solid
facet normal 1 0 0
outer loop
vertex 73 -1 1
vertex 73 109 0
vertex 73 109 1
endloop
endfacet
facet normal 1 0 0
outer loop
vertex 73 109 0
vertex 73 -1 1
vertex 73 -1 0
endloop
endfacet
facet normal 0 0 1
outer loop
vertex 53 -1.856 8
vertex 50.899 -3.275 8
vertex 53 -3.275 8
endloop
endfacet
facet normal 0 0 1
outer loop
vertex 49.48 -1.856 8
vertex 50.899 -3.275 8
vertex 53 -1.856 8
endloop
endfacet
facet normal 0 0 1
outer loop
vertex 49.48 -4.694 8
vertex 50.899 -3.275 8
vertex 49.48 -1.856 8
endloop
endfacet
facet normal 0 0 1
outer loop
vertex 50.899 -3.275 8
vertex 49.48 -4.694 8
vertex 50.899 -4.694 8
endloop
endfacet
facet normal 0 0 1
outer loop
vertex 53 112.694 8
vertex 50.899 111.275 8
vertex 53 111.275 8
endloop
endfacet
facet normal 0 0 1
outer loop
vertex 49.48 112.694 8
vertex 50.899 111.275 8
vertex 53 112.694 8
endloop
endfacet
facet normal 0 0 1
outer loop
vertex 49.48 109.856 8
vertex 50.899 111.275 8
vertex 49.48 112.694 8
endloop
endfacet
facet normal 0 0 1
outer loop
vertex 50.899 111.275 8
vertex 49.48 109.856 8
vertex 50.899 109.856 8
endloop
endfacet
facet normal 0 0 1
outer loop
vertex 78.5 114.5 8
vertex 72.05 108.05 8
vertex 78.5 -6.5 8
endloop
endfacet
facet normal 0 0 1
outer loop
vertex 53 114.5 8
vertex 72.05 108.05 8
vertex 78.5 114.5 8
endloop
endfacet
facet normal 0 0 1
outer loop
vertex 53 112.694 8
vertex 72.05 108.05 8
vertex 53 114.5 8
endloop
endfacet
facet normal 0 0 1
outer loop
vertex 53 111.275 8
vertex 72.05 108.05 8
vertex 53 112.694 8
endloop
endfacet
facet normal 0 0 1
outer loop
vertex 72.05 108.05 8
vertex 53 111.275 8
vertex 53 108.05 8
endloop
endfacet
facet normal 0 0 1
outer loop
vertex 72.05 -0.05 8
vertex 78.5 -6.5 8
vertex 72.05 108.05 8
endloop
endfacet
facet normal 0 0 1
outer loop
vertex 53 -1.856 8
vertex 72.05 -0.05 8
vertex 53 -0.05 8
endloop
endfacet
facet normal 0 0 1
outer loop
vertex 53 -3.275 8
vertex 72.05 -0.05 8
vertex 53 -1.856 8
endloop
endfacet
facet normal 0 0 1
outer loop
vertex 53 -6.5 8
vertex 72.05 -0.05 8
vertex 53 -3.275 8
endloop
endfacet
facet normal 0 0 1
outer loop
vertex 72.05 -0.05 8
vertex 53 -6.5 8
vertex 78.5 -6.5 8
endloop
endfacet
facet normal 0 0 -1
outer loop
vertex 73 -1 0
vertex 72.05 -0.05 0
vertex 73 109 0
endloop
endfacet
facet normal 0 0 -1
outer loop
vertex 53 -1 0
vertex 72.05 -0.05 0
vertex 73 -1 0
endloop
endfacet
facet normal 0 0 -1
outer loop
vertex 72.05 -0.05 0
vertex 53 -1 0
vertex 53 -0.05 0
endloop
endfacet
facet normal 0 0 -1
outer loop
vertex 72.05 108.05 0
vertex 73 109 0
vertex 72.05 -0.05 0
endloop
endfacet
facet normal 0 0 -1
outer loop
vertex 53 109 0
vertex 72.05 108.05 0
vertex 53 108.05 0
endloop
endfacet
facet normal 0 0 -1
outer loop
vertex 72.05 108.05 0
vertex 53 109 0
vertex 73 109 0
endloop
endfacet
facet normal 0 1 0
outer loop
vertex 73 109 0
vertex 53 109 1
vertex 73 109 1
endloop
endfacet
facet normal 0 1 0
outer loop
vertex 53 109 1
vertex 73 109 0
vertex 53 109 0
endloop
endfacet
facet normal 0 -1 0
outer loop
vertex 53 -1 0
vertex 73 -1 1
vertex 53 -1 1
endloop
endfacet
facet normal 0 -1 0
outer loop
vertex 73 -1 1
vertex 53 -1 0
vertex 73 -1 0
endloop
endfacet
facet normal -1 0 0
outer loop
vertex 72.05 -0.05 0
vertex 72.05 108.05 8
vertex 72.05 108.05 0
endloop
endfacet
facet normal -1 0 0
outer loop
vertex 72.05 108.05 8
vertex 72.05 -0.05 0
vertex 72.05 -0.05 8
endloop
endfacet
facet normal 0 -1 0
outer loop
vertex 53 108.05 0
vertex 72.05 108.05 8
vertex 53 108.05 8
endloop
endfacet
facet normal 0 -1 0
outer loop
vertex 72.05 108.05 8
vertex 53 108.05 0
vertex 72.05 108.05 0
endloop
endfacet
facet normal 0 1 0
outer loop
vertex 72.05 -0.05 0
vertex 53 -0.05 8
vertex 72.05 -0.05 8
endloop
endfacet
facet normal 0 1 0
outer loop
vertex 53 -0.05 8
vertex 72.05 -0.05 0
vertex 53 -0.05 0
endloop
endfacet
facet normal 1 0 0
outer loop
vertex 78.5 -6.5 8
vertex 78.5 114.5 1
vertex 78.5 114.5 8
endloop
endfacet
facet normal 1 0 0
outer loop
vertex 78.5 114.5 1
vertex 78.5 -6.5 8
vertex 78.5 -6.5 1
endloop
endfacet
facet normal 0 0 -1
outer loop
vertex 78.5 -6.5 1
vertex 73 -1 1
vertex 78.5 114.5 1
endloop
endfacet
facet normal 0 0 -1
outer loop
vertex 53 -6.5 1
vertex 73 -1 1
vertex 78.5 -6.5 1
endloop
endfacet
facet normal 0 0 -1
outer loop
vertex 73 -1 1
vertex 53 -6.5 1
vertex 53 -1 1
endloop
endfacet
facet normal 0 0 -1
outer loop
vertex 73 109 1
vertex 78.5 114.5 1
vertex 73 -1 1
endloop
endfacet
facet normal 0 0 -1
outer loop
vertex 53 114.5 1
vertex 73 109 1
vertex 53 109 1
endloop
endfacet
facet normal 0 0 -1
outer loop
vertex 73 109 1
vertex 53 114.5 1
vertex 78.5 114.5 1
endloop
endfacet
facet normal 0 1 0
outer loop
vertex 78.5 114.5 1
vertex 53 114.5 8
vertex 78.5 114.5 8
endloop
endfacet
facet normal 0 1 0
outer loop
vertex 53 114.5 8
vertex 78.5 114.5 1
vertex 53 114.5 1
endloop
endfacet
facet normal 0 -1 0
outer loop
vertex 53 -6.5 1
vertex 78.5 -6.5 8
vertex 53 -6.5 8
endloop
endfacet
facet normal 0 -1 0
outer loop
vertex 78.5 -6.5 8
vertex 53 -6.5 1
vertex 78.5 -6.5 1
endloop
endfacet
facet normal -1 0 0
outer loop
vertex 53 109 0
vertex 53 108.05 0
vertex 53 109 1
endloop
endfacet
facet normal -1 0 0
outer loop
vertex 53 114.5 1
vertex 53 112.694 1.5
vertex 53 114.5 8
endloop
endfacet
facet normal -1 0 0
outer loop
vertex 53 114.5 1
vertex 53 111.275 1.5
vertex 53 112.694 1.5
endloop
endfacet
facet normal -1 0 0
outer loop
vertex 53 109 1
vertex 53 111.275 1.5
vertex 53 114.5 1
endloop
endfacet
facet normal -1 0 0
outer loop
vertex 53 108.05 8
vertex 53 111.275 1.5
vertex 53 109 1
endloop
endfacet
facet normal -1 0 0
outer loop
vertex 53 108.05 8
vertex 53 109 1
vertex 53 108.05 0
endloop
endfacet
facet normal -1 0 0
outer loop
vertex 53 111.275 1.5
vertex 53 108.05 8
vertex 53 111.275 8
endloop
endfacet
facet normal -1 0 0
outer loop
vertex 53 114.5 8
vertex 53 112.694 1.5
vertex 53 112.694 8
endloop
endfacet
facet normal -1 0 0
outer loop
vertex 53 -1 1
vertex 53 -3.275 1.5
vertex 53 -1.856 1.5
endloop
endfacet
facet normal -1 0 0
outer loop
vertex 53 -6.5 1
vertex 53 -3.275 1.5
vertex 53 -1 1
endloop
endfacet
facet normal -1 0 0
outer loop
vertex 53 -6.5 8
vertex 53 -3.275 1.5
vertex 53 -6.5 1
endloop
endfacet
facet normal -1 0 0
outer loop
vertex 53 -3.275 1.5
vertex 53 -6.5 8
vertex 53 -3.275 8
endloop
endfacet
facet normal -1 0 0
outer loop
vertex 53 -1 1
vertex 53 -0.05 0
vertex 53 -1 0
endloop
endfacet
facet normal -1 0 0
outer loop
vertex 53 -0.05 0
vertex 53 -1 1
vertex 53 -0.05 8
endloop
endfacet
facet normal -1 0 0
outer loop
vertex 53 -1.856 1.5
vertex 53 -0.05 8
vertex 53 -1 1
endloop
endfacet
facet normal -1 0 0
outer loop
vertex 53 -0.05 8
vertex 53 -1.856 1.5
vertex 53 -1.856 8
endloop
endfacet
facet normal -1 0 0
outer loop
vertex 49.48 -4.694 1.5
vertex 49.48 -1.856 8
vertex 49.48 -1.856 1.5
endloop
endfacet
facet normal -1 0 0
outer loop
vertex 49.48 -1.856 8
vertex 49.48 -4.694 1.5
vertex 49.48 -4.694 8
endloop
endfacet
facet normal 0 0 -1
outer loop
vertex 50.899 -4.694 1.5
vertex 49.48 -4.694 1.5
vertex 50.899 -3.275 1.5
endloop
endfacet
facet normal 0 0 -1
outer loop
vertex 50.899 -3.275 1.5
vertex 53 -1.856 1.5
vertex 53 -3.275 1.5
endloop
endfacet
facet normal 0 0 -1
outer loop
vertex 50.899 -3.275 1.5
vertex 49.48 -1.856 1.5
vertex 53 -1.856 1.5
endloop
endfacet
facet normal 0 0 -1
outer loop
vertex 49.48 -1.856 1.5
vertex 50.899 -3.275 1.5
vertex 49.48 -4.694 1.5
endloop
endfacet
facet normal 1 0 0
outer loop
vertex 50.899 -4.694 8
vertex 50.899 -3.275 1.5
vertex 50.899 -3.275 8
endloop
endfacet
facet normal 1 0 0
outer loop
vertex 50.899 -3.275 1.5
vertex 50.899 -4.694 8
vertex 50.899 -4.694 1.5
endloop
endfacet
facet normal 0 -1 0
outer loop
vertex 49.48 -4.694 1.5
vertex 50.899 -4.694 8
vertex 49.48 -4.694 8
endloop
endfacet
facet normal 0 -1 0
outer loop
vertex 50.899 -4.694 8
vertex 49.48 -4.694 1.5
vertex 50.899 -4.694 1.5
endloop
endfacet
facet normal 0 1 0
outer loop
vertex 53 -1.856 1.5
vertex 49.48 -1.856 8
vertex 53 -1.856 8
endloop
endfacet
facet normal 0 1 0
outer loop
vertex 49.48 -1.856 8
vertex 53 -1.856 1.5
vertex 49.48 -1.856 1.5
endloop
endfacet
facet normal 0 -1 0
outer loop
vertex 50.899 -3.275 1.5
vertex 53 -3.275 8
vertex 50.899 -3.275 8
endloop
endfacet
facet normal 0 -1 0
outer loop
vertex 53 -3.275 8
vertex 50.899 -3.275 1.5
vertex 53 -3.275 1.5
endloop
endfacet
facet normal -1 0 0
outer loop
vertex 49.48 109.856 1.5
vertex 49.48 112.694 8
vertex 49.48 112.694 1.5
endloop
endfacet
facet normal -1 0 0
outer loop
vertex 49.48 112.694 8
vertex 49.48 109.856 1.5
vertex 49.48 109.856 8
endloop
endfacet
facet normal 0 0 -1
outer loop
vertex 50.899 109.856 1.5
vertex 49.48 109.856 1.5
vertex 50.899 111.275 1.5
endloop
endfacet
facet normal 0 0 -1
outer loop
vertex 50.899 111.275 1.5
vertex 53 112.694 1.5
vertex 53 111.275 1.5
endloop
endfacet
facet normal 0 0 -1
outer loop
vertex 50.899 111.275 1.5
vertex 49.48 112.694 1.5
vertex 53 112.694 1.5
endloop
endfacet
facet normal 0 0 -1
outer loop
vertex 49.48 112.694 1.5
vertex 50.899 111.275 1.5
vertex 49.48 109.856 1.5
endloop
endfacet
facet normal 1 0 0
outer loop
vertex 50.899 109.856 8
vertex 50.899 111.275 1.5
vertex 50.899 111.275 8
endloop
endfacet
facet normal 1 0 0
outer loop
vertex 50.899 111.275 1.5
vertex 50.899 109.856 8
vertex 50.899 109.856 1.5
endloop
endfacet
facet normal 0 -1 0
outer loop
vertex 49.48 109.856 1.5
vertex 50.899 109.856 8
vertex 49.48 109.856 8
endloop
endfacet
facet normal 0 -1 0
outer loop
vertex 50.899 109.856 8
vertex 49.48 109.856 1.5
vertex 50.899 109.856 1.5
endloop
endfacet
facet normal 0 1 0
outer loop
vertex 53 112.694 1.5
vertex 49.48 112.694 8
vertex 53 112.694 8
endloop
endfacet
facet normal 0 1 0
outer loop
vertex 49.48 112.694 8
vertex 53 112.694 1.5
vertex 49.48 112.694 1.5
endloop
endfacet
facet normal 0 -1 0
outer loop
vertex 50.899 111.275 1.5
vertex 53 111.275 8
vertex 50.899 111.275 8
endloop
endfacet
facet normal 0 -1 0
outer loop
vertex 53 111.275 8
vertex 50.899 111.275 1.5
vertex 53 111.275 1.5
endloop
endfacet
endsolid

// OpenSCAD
// Generated by SolidPython 1.0.4 on 2021-01-19 17:41:34


union() {
	union() {
		difference() {
			union() {
				difference() {
					translate(v = [-1.0000000000, -1.0000000000, 0]) {
						cube(size = [74.0000000000, 110.0000000000, 8]);
					}
					translate(v = [-0.0500000000, -0.0500000000, 0]) {
						cube(size = [72.1000000000, 108.1000000000, 8]);
					}
				}
				translate(v = [0, 0, 1]) {
					difference() {
						translate(v = [-6.5000000000, -6.5000000000, 0]) {
							cube(size = [85.0000000000, 121.0000000000, 7]);
						}
						translate(v = [-1.0000000000, -1.0000000000, 0]) {
							cube(size = [74.0000000000, 110.0000000000, 7]);
						}
					}
				}
			}
			translate(v = [-6.5000000000, -6.5000000000, 0]) {
				cube(size = [59.5000000000, 121.0000000000, 8]);
			}
		}
		translate(v = [49.0000000000, -4.6940000000, 0]) {
			translate(v = [0.4800000000, 0, 1.5000000000]) {
				scale(v = [0.8800000000, 0.8800000000, 1]) {
					translate(v = [4, 3.2250000000, 0]) {
						rotate(a = -180) {
							union() {
								translate(v = [2.3875000000, 0, 0]) {
									cube(size = [1.6125000000, 3.2250000000, 6.5000000000]);
								}
								cube(size = [4, 1.6125000000, 6.5000000000]);
							}
						}
					}
				}
			}
		}
	}
	translate(v = [49.0000000000, 109.8560000000, 0]) {
		translate(v = [0.4800000000, 0, 1.5000000000]) {
			scale(v = [0.8800000000, 0.8800000000, 1]) {
				translate(v = [4, 3.2250000000, 0]) {
					rotate(a = -180) {
						union() {
							translate(v = [2.3875000000, 0, 0]) {
								cube(size = [1.6125000000, 3.2250000000, 6.5000000000]);
							}
							cube(size = [4, 1.6125000000, 6.5000000000]);
						}
					}
				}
			}
		}
	}
}
